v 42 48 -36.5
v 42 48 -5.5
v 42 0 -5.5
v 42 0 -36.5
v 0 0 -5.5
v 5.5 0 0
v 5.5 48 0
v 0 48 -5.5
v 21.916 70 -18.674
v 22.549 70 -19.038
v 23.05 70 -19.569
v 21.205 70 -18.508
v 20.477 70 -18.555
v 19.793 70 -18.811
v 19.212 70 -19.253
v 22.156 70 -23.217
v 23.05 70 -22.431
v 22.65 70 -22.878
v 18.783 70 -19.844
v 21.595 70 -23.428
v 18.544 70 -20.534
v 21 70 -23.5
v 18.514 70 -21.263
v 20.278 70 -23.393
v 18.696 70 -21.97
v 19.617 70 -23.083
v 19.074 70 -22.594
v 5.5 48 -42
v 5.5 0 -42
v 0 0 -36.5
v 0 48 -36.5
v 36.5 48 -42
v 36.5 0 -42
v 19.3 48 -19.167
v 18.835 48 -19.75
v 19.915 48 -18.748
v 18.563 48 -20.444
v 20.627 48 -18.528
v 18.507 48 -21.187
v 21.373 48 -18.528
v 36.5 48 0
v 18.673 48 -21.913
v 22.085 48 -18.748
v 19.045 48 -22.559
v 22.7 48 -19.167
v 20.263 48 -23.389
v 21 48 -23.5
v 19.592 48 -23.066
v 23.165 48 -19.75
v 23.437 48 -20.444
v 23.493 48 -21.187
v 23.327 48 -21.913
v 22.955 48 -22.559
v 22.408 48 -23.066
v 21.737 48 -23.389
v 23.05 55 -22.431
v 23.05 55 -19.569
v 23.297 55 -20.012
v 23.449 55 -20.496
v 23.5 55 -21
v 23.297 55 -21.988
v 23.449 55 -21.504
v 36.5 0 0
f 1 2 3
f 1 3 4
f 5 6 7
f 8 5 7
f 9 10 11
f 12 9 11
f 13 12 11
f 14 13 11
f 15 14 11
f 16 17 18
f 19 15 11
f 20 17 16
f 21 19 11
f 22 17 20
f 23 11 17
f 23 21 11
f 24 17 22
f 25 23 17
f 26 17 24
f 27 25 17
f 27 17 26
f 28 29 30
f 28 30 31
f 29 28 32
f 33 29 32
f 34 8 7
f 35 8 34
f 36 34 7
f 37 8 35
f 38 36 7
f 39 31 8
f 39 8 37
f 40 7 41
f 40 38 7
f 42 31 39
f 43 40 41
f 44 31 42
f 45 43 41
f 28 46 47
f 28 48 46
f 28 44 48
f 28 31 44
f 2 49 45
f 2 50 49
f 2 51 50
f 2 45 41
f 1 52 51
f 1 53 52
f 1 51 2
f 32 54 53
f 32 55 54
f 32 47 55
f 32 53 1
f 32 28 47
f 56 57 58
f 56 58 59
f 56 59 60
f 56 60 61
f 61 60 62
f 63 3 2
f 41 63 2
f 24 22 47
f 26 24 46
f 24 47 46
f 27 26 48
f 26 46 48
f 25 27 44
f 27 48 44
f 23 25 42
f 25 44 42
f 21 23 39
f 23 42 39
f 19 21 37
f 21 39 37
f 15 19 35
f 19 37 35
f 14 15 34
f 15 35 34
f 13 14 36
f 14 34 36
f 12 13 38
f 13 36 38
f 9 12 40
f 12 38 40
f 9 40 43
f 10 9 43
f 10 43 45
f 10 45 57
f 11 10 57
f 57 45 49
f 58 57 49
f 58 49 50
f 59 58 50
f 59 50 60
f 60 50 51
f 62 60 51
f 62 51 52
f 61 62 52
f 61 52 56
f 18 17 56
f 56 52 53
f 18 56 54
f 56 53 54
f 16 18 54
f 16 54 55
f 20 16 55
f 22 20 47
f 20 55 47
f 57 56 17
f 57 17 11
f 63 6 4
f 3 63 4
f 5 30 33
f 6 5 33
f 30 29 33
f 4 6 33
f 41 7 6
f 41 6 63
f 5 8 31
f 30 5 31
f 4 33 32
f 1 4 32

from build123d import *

# Parameters (mm, degrees)
SKETCH1_W           = 42
SKETCH1_H           = 42
BODY_DEPTH          = 48
CHAMFER1_SIZE       = 5.5
SKETCH2_R           = 2.5
SHAFT_DEPTH         = 22
SHAFTORIENTER_START = -15
SHAFTORIENTER_DEPTH = 15


with BuildPart() as part:
    # Sketch1 → Body (new body)
    with BuildSketch(Plane(origin=(0, 0, 0), x_dir=(1, 0, 0), z_dir=(0, 1, 0))):
        with Locations((21, 21)):
            Rectangle(SKETCH1_W, SKETCH1_H)
    extrude(amount=BODY_DEPTH)

    # Chamfer1
    chamfer1_edges = [part.edges().sort_by_distance(p)[0] for p in [
        (0, 24, -42),
        (42, 24, -42),
        (42, 24, 0),
        (0, 24, 0),
    ]]
    chamfer(chamfer1_edges, length=CHAMFER1_SIZE)

    # Sketch2 → Shaft (add)
    with BuildSketch(Plane(origin=(0, 48, 0), x_dir=(1, 0, 0), z_dir=(0, 1, 0))):
        with Locations(Location((21, 21, 0), (0, 0, 90))):
            Circle(SKETCH2_R)
    extrude(amount=SHAFT_DEPTH)

    # Sketch3 → ShaftOrienter (cut)
    with BuildSketch(Plane(origin=(0, 70, 0), x_dir=(1, 0, 0), z_dir=(0, 1, 0)).offset(SHAFTORIENTER_START)):
        with BuildLine():
            Line((23.05, 22.430908802), (23.05, 19.569091198))
            ThreePointArc((23.05, 19.569091198), (23.384848004, 20.25), (23.5, 21))
            ThreePointArc((23.5, 21), (23.384848004, 21.75), (23.05, 22.430908802))
        make_face()
    extrude(amount=SHAFTORIENTER_DEPTH, mode=Mode.SUBTRACT)


solid = part.part
